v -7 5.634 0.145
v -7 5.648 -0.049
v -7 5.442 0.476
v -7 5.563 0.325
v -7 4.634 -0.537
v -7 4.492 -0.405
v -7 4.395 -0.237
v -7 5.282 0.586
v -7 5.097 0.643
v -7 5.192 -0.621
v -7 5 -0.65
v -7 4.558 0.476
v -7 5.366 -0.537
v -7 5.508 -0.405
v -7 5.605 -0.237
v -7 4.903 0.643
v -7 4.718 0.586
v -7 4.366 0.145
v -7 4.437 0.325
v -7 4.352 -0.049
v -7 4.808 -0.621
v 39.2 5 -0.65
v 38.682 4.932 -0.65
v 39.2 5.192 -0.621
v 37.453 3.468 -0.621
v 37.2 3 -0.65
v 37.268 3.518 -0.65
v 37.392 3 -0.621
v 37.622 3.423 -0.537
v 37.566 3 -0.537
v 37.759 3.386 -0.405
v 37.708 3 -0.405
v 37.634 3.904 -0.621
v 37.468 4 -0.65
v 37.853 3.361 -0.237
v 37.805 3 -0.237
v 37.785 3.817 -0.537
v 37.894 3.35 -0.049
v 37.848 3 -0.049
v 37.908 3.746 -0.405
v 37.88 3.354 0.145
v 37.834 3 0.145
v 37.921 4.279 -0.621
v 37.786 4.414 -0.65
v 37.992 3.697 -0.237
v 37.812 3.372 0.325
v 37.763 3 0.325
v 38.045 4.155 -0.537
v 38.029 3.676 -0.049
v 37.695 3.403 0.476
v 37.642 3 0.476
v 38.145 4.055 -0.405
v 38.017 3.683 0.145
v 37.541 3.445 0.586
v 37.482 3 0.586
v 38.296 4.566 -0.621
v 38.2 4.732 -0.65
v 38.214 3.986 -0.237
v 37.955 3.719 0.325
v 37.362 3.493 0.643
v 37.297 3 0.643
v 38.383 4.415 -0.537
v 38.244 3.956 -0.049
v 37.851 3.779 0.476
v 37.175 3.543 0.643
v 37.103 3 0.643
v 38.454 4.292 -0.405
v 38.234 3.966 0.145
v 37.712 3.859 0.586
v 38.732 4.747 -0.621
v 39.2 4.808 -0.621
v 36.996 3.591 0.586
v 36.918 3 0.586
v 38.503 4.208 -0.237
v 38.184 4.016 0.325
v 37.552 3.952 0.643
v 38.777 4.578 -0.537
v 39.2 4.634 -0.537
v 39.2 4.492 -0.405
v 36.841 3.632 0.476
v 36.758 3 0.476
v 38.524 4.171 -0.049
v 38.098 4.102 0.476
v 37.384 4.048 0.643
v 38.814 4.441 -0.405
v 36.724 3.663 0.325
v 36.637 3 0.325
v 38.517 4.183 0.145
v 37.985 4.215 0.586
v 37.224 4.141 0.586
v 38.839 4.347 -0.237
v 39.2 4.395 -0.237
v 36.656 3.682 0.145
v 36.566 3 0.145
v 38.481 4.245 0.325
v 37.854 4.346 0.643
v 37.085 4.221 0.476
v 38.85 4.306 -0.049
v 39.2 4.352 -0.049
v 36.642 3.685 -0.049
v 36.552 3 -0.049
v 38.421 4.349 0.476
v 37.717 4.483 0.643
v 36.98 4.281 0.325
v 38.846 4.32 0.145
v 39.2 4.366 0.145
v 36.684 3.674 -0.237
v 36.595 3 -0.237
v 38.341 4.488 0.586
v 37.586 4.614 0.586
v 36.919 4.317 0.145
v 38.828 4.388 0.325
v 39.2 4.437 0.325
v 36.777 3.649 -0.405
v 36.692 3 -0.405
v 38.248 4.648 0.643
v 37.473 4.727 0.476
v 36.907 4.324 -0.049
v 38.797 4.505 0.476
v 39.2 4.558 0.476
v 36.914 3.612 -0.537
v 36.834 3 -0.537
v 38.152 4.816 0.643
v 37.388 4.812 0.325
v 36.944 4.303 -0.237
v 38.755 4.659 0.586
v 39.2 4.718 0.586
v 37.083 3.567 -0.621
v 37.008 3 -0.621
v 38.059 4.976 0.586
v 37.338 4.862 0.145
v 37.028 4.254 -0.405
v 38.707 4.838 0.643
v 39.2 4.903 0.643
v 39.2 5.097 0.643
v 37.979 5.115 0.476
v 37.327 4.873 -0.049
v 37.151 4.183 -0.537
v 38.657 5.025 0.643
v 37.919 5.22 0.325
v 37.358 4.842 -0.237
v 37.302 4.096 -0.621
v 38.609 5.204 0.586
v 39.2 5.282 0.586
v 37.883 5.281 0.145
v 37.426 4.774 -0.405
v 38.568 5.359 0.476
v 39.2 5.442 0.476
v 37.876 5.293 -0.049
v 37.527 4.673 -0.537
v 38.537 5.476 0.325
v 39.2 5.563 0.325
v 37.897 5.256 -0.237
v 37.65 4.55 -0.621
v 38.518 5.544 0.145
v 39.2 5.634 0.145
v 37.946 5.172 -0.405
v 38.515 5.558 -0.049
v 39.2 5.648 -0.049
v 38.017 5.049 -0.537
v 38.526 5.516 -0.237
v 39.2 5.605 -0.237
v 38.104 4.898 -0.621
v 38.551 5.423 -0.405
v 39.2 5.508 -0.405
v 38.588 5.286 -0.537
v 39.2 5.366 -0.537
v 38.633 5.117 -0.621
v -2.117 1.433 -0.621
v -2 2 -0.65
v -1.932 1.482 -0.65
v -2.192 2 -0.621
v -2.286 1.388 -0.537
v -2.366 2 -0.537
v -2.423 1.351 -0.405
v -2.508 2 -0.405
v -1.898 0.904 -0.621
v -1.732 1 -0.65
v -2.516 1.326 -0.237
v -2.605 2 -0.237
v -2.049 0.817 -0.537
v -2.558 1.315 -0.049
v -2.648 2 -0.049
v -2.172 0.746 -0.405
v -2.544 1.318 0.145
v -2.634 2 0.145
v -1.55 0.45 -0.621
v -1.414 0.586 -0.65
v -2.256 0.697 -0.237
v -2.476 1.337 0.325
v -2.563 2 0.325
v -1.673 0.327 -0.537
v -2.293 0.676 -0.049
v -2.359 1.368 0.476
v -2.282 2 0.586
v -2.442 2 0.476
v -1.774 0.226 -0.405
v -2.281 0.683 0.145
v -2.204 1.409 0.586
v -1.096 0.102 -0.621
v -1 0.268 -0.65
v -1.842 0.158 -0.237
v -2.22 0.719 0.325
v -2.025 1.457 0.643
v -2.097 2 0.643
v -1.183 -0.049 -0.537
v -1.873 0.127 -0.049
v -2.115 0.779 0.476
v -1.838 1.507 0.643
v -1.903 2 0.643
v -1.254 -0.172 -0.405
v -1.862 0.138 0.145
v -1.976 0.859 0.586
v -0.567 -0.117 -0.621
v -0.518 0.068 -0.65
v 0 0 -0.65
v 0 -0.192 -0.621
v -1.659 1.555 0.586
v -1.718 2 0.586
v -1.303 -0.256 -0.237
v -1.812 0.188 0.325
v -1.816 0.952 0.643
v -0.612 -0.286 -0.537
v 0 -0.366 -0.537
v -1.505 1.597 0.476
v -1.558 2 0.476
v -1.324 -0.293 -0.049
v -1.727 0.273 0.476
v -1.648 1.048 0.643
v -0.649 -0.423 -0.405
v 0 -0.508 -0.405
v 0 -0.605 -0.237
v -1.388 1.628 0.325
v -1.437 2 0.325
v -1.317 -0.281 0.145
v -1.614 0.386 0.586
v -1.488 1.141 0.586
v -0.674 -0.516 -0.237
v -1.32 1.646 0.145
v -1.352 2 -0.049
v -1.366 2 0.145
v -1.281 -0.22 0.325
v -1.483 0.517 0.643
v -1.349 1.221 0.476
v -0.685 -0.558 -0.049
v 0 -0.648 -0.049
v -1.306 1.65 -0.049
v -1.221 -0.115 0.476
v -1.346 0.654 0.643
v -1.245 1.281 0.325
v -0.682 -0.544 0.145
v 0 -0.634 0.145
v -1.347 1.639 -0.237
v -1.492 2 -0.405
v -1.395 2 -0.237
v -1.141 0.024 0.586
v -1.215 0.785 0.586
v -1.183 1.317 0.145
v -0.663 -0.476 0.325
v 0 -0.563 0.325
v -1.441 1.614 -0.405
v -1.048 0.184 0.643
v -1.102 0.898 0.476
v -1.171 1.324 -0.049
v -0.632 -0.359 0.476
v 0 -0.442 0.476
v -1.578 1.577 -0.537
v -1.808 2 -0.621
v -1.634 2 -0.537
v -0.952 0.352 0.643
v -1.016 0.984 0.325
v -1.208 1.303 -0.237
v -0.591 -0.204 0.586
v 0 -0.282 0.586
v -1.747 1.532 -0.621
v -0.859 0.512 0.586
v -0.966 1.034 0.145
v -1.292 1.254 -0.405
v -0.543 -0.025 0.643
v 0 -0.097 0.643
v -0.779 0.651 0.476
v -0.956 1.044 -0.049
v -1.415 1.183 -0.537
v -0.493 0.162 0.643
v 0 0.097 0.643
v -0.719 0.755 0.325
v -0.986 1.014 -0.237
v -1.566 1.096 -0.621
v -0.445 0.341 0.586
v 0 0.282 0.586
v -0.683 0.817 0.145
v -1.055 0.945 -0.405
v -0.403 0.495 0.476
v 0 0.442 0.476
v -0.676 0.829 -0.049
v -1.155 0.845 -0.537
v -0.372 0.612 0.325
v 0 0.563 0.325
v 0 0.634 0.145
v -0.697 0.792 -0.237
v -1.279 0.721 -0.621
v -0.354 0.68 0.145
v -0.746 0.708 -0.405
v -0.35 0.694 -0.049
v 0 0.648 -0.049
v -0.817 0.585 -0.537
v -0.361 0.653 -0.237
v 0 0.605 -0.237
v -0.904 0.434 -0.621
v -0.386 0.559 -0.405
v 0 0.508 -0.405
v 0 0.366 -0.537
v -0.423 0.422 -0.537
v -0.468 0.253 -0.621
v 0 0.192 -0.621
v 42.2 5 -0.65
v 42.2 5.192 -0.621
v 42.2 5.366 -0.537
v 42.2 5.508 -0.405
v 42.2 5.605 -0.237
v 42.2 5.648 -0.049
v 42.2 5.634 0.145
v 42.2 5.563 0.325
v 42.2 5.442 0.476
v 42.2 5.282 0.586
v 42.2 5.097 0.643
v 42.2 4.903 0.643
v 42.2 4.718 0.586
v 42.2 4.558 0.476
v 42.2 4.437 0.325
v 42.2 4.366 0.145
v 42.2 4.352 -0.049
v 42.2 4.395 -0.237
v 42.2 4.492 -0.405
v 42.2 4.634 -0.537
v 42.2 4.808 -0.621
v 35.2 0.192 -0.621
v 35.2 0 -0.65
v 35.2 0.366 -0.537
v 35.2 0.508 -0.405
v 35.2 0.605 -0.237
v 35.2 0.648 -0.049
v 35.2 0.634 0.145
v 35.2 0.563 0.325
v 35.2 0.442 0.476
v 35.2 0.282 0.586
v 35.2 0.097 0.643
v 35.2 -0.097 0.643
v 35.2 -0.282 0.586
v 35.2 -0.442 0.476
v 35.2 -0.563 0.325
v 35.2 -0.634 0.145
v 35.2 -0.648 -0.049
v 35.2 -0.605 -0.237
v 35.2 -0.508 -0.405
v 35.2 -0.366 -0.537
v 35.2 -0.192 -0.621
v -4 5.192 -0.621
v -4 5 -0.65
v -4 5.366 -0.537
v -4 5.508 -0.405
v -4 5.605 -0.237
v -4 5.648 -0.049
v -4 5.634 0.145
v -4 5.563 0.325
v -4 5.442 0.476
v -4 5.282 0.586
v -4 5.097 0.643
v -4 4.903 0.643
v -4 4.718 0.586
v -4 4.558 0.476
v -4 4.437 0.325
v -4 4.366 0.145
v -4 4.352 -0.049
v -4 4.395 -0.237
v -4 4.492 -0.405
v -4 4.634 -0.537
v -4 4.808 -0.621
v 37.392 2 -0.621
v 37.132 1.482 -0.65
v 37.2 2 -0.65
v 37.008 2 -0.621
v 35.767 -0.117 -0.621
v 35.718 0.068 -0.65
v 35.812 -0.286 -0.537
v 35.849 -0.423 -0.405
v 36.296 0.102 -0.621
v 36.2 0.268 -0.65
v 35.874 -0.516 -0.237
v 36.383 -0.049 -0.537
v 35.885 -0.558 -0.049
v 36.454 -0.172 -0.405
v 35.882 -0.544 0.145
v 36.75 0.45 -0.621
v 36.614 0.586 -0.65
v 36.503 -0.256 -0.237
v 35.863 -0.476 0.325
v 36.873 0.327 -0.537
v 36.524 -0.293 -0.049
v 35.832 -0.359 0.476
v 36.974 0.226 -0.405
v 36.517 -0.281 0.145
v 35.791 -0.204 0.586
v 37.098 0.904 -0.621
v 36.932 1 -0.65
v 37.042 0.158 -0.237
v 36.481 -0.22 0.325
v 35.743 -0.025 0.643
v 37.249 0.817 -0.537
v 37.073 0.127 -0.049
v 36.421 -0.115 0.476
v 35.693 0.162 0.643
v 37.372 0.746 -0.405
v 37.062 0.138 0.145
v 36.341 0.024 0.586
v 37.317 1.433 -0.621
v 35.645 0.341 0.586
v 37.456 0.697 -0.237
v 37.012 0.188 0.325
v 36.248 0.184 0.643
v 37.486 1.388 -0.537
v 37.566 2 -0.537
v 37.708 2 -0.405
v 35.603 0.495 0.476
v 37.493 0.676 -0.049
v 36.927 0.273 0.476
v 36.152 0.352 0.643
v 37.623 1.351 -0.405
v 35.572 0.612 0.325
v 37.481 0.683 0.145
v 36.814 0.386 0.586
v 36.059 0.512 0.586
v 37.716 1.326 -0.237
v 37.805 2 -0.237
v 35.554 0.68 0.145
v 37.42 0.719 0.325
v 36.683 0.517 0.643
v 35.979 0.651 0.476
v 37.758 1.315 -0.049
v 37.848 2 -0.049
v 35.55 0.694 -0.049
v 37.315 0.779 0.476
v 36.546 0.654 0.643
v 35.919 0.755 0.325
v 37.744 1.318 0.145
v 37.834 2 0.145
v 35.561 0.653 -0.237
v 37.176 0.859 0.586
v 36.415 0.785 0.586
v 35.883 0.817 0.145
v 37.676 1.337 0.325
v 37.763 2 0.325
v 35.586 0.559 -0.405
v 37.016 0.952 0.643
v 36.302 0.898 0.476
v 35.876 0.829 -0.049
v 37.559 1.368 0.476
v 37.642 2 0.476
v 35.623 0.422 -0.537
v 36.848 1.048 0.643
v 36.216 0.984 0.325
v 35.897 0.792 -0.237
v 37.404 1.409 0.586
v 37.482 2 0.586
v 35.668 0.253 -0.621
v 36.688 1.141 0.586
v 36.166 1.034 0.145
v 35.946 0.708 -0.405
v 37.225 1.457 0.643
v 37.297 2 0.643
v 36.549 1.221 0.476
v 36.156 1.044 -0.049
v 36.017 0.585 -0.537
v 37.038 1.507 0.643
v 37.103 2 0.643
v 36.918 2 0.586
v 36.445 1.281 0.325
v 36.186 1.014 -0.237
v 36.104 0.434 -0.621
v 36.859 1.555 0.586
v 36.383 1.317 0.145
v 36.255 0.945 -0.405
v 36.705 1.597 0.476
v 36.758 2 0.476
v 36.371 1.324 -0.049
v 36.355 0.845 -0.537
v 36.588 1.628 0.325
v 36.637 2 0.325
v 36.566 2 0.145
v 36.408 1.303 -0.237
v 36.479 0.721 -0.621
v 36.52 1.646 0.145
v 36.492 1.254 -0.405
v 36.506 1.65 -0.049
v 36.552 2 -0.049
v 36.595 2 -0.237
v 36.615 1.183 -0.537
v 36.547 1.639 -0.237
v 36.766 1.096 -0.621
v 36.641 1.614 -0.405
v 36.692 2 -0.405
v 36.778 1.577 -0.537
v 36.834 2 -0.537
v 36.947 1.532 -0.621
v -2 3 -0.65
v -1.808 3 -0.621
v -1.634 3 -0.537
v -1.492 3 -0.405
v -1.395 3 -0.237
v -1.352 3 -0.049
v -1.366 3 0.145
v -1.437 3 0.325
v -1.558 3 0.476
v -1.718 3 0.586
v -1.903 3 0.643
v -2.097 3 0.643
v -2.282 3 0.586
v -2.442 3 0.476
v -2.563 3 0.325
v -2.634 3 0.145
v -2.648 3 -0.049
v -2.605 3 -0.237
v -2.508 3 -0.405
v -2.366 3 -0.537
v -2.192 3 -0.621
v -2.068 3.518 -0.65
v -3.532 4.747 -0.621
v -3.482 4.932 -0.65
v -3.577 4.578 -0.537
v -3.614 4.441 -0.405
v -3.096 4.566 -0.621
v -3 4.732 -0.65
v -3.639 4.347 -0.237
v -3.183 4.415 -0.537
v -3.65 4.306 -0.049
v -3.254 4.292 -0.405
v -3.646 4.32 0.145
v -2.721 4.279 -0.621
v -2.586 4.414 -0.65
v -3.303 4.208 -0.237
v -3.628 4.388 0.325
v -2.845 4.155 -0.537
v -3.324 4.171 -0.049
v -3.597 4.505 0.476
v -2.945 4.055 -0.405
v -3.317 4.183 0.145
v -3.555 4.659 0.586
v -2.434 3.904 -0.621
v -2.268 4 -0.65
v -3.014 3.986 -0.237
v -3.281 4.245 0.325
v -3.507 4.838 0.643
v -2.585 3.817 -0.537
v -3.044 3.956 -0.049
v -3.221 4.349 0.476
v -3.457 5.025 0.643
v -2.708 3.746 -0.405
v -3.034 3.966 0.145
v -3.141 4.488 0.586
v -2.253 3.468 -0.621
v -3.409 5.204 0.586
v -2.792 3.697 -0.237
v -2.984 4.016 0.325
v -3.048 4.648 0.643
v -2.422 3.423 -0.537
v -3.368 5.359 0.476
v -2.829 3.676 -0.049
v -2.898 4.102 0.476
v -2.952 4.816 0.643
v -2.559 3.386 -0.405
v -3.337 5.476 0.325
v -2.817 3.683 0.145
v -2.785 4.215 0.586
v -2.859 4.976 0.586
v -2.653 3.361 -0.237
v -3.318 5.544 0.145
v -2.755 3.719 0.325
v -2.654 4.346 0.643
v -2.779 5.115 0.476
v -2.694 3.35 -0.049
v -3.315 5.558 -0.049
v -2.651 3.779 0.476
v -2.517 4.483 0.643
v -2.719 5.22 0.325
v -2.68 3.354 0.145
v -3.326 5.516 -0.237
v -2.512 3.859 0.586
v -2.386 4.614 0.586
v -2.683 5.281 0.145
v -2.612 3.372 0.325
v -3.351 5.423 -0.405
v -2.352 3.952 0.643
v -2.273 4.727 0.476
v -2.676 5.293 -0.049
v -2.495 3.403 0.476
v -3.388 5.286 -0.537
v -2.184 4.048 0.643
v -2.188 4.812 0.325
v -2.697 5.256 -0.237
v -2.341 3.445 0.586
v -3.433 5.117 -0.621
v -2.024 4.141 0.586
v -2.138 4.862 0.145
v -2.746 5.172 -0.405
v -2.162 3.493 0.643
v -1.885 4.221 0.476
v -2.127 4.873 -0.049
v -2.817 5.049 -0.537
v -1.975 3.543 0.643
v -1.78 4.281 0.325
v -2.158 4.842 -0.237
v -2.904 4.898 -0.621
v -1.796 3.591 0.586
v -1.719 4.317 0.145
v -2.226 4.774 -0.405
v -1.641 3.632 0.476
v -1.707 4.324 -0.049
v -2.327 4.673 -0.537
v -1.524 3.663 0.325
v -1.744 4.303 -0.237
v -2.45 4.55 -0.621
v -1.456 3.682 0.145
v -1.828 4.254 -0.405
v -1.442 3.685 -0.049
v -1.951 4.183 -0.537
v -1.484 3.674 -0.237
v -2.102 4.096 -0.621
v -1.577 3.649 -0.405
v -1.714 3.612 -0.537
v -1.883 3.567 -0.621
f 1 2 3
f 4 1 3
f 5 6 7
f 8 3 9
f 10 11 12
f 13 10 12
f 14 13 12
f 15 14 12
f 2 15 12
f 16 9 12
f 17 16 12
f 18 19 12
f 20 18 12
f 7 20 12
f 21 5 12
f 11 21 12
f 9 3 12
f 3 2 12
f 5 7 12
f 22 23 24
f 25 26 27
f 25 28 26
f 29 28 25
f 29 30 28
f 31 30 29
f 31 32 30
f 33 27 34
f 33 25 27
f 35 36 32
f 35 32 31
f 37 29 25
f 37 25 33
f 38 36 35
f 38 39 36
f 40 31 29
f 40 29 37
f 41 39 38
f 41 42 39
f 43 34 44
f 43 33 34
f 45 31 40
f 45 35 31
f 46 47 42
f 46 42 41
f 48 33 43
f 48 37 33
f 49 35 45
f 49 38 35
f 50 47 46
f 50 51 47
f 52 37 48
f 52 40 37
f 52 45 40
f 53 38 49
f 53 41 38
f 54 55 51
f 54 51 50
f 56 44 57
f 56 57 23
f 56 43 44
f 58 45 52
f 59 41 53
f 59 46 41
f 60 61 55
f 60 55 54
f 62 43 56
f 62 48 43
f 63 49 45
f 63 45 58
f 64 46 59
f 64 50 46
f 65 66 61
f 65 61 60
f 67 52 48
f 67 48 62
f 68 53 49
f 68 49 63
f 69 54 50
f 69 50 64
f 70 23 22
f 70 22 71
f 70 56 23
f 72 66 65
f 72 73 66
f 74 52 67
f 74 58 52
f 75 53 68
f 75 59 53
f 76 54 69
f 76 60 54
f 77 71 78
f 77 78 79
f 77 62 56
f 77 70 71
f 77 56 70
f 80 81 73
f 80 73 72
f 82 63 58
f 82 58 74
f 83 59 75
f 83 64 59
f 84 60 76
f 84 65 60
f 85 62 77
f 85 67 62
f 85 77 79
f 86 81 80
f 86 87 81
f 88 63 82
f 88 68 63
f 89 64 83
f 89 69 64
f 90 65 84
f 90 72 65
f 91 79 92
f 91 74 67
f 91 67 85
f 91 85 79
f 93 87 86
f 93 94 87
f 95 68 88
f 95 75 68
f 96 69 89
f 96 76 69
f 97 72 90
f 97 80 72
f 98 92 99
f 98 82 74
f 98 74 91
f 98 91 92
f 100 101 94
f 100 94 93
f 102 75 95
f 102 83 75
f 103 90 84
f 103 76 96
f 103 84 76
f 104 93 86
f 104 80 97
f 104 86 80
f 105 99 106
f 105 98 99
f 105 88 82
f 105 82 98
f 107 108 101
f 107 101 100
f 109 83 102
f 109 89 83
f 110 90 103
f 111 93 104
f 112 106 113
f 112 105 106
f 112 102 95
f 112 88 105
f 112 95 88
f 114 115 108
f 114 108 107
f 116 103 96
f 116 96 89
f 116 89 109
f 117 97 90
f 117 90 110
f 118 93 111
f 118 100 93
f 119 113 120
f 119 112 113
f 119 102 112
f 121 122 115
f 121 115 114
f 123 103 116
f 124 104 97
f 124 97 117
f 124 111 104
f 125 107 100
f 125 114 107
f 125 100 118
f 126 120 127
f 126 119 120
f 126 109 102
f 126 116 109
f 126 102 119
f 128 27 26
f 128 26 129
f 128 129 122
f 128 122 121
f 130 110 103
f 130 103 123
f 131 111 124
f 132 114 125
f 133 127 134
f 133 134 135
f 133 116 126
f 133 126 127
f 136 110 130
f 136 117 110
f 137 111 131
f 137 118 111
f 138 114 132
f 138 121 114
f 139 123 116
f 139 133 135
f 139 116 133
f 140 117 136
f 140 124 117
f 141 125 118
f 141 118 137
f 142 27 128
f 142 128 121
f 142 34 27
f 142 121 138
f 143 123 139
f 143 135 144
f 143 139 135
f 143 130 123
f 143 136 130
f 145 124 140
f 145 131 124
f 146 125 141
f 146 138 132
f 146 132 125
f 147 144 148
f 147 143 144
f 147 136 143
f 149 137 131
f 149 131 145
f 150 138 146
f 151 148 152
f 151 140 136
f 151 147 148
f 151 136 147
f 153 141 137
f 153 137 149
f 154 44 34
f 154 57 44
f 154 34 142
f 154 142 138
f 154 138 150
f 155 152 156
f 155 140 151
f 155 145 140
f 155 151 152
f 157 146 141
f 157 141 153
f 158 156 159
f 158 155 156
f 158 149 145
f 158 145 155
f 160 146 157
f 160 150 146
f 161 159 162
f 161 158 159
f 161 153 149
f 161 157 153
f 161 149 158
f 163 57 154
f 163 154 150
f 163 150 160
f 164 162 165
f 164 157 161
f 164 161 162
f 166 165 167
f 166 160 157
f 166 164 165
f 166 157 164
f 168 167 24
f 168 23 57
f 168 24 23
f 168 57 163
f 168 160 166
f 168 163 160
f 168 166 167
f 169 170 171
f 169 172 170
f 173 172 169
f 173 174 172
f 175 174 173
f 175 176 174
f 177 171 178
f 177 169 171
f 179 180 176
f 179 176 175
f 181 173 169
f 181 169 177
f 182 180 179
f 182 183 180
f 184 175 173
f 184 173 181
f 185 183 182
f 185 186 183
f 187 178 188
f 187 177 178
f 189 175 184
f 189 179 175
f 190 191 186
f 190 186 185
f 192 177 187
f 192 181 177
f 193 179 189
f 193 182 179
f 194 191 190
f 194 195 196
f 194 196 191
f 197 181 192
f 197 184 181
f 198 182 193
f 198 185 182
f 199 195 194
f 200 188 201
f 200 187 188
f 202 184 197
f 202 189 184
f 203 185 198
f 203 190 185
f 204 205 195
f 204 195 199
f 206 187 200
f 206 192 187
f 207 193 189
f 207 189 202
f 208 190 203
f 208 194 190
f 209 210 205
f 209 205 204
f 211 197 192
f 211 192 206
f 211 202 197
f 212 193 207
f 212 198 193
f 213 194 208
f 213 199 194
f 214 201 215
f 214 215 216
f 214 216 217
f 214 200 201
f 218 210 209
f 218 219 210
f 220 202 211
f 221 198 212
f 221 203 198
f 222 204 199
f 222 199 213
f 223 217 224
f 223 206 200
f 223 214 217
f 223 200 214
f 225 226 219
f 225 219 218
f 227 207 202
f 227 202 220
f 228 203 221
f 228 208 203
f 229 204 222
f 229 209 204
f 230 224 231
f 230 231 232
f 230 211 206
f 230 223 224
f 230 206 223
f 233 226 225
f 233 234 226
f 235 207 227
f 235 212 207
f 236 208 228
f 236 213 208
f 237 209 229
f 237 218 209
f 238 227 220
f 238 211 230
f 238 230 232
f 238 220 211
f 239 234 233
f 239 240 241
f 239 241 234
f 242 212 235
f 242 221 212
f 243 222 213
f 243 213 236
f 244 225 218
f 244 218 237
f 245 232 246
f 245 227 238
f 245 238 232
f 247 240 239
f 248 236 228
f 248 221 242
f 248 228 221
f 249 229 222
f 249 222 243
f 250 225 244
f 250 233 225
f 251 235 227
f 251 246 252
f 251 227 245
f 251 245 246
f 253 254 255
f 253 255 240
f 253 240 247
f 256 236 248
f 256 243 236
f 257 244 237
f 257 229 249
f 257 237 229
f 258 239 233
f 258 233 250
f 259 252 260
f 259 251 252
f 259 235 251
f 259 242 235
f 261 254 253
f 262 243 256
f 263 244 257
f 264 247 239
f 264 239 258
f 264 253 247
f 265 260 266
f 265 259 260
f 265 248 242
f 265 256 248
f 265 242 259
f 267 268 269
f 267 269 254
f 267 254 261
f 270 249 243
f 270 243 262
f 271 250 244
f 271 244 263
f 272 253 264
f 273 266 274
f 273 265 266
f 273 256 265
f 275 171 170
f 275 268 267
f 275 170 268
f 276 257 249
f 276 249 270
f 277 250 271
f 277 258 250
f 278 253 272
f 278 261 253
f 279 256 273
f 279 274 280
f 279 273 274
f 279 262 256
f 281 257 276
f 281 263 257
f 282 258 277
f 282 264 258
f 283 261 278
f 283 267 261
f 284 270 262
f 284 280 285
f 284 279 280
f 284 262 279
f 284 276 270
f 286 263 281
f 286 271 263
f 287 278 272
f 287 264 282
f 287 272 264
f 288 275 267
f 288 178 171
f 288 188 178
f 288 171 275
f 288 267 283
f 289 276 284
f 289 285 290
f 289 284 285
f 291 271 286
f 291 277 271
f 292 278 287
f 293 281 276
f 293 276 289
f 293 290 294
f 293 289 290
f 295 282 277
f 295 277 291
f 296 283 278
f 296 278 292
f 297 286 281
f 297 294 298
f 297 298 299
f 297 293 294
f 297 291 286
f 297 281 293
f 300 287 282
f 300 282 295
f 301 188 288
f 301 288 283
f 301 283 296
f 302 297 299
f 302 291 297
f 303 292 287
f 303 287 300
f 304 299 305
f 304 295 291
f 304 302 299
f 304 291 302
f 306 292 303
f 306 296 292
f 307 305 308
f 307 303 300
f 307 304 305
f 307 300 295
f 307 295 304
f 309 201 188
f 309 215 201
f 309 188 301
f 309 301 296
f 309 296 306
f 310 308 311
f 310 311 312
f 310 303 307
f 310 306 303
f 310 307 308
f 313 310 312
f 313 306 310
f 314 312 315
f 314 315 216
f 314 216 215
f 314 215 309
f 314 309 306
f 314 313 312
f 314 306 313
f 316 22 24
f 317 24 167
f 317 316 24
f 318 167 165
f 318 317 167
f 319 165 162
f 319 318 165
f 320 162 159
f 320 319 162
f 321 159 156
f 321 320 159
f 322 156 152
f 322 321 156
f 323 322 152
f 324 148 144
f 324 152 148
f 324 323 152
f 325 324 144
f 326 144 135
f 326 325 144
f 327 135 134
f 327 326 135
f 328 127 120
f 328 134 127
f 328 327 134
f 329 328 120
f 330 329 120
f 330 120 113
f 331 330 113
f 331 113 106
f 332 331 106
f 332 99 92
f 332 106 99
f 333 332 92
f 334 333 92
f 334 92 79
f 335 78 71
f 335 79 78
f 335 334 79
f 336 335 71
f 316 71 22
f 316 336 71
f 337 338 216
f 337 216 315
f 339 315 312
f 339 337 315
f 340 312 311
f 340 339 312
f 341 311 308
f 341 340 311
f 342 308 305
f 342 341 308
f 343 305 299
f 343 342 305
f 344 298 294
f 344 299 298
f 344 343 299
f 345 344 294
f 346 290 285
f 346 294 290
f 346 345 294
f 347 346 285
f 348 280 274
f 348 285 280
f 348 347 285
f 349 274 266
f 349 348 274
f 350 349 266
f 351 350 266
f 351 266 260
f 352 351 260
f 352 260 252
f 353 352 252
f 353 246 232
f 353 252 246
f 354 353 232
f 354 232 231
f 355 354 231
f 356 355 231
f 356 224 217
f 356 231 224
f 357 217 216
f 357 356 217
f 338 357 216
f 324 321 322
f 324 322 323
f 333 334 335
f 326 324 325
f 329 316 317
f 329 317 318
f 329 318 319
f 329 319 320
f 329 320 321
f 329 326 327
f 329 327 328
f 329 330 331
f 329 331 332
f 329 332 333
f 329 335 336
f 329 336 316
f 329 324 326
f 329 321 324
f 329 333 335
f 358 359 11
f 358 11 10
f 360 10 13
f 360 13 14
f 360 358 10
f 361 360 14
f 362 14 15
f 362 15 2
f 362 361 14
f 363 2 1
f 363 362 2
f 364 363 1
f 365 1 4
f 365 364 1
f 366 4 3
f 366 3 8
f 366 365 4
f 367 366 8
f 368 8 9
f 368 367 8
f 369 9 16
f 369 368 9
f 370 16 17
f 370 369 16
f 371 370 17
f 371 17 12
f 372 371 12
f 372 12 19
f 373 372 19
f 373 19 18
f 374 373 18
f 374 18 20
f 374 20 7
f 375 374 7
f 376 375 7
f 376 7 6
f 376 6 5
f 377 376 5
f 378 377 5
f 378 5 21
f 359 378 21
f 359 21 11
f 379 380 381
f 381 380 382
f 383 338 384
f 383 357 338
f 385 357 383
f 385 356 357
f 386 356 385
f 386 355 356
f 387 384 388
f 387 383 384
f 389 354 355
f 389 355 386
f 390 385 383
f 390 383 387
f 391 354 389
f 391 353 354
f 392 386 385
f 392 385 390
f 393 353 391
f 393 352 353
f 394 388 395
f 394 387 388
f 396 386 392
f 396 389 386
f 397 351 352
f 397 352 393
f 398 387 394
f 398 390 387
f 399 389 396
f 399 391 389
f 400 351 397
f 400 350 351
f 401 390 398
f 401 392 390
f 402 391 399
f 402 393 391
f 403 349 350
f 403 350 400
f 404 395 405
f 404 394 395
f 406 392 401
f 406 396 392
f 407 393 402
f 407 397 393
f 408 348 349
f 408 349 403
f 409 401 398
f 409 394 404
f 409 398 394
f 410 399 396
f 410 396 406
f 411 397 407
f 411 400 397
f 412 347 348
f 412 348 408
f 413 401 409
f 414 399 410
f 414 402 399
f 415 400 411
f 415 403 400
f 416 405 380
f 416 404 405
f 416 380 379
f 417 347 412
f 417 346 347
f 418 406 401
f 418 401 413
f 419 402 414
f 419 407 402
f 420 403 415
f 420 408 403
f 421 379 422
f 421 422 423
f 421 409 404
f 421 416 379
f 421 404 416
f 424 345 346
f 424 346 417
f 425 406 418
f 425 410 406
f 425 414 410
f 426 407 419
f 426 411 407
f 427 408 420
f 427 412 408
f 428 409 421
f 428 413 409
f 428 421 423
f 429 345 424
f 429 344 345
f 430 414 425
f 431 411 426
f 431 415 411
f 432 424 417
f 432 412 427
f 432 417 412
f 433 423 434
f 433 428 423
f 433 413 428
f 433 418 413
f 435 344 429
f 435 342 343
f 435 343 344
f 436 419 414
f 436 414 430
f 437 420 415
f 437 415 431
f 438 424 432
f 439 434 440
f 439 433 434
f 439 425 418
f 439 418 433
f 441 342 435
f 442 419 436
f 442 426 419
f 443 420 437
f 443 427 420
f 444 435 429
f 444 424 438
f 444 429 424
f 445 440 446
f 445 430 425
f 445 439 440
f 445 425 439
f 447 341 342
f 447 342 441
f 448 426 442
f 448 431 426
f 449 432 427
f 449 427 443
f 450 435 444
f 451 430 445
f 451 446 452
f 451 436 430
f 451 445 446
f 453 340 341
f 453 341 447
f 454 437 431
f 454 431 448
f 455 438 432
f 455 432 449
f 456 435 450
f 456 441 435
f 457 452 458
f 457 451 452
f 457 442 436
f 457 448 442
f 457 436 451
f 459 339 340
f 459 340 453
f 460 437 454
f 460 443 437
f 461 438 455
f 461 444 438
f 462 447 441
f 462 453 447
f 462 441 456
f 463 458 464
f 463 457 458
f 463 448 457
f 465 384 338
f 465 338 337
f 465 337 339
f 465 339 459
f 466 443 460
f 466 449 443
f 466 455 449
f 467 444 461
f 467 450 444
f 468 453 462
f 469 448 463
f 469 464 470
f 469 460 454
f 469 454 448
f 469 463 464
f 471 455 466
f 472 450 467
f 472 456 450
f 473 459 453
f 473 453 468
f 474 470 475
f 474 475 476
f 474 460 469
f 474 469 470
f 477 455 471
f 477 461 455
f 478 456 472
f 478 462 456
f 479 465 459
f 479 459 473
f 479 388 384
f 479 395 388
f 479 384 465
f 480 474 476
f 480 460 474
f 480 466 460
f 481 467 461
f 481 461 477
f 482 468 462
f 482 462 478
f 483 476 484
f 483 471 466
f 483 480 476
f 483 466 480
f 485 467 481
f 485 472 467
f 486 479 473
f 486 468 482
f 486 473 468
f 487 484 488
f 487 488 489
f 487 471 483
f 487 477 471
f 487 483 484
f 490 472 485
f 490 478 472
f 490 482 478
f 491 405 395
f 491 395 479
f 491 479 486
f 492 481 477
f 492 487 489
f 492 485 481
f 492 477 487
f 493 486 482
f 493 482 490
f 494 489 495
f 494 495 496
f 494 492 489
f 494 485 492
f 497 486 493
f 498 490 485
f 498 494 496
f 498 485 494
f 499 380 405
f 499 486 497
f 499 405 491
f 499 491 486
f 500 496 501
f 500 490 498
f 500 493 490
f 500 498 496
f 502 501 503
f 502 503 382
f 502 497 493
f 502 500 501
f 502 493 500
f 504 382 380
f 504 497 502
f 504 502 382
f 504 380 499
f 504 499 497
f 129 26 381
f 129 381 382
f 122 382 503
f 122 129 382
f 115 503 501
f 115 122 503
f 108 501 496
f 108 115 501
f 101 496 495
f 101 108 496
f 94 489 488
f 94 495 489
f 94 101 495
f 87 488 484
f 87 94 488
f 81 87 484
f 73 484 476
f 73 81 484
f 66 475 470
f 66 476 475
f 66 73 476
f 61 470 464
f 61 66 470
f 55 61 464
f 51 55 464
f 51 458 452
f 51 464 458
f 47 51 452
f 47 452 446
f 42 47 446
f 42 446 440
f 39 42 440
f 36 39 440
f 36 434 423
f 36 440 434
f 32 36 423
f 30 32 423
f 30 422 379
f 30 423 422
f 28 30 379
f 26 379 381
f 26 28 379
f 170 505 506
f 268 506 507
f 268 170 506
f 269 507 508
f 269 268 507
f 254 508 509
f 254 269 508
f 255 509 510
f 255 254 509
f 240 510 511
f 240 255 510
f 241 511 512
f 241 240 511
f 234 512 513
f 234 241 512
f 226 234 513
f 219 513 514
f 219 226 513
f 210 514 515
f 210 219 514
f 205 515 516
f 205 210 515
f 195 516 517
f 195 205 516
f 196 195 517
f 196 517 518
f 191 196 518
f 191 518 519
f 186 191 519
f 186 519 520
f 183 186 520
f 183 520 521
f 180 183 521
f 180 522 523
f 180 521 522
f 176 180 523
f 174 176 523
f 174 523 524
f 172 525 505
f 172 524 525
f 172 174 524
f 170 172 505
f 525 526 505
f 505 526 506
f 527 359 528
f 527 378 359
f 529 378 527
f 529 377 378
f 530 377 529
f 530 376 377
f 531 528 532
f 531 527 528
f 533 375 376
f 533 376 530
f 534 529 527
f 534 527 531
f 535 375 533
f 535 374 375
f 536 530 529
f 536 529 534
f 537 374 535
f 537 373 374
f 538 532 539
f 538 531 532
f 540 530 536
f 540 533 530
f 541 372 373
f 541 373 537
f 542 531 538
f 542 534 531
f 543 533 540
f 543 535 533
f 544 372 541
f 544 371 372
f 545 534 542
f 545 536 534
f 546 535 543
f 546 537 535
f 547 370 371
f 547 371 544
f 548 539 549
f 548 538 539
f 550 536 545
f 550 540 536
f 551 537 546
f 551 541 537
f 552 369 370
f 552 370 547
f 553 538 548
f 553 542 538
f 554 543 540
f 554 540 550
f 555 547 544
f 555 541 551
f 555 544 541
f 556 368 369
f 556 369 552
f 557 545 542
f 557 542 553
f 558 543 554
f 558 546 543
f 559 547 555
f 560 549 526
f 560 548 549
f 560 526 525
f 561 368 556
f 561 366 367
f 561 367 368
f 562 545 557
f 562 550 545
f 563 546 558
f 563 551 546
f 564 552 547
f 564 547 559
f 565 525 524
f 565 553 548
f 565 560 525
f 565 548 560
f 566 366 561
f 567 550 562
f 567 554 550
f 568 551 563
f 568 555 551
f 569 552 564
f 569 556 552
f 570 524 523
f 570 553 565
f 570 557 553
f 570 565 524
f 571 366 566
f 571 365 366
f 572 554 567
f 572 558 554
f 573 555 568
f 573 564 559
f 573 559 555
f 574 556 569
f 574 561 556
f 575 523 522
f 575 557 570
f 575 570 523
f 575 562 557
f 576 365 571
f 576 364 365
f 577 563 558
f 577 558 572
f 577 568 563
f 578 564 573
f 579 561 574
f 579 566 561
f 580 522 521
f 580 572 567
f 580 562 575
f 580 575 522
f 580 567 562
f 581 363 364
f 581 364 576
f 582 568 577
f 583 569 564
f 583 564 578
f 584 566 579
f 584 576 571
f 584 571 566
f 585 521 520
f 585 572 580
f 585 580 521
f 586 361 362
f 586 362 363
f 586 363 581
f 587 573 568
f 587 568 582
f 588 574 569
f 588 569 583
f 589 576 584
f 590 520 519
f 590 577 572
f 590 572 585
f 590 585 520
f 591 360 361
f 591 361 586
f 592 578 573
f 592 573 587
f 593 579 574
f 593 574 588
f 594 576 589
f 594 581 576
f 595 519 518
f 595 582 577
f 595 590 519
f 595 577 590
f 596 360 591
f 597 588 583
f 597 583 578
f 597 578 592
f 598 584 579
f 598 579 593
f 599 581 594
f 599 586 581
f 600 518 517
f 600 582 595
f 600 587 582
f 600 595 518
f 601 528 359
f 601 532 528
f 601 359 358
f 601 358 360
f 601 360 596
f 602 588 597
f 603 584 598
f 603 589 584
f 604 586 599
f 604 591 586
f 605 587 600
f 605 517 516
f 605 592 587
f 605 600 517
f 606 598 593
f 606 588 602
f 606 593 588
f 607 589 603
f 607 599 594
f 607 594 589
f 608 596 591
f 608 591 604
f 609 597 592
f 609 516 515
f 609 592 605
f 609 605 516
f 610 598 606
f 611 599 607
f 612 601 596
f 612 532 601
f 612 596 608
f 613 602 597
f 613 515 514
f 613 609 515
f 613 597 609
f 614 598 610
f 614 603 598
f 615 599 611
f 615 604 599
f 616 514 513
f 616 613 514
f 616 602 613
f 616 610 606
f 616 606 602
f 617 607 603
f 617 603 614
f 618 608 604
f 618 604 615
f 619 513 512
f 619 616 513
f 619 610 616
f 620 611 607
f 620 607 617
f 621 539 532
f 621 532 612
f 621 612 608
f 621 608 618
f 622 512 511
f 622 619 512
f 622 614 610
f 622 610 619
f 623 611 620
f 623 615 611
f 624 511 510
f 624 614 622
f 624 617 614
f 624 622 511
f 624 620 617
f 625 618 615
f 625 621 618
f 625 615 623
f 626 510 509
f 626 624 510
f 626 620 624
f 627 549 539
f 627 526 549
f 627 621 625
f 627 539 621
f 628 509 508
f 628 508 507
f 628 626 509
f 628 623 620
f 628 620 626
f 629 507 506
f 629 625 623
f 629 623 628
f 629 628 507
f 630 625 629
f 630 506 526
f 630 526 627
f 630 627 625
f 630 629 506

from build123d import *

# Parameters (mm, degrees)
SKETCH2_R = 0.65


with BuildPart() as part:
    # Sweep1: sweep along a path in Sketch1
    with BuildLine(Plane.XY) as sweep1_path:
        Line((-7, 5), (-4, 5))
        ThreePointArc((-4, 5), (-2.585786438, 4.414213562), (-2, 3))
        Line((-2, 3), (-2, 2))
        ThreePointArc((-2, 2), (-1.414213562, 0.585786438), (0, 0))
        Line((0, 0), (35.2, 0))
        ThreePointArc((35.2, 0), (36.614213562, 0.585786438), (37.2, 2))
        Line((37.2, 2), (37.2, 3))
        ThreePointArc((37.2, 3), (37.785786438, 4.414213562), (39.2, 5))
        Line((39.2, 5), (42.2, 5))
    # Sketch2 → Sweep1 (sweep)
    with BuildSketch(Plane(origin=(35.2, 0, 0), x_dir=(0, 0, -1), z_dir=(1, 0, 0))):
        Circle(SKETCH2_R)
    sweep(path=sweep1_path.line)


solid = part.part
